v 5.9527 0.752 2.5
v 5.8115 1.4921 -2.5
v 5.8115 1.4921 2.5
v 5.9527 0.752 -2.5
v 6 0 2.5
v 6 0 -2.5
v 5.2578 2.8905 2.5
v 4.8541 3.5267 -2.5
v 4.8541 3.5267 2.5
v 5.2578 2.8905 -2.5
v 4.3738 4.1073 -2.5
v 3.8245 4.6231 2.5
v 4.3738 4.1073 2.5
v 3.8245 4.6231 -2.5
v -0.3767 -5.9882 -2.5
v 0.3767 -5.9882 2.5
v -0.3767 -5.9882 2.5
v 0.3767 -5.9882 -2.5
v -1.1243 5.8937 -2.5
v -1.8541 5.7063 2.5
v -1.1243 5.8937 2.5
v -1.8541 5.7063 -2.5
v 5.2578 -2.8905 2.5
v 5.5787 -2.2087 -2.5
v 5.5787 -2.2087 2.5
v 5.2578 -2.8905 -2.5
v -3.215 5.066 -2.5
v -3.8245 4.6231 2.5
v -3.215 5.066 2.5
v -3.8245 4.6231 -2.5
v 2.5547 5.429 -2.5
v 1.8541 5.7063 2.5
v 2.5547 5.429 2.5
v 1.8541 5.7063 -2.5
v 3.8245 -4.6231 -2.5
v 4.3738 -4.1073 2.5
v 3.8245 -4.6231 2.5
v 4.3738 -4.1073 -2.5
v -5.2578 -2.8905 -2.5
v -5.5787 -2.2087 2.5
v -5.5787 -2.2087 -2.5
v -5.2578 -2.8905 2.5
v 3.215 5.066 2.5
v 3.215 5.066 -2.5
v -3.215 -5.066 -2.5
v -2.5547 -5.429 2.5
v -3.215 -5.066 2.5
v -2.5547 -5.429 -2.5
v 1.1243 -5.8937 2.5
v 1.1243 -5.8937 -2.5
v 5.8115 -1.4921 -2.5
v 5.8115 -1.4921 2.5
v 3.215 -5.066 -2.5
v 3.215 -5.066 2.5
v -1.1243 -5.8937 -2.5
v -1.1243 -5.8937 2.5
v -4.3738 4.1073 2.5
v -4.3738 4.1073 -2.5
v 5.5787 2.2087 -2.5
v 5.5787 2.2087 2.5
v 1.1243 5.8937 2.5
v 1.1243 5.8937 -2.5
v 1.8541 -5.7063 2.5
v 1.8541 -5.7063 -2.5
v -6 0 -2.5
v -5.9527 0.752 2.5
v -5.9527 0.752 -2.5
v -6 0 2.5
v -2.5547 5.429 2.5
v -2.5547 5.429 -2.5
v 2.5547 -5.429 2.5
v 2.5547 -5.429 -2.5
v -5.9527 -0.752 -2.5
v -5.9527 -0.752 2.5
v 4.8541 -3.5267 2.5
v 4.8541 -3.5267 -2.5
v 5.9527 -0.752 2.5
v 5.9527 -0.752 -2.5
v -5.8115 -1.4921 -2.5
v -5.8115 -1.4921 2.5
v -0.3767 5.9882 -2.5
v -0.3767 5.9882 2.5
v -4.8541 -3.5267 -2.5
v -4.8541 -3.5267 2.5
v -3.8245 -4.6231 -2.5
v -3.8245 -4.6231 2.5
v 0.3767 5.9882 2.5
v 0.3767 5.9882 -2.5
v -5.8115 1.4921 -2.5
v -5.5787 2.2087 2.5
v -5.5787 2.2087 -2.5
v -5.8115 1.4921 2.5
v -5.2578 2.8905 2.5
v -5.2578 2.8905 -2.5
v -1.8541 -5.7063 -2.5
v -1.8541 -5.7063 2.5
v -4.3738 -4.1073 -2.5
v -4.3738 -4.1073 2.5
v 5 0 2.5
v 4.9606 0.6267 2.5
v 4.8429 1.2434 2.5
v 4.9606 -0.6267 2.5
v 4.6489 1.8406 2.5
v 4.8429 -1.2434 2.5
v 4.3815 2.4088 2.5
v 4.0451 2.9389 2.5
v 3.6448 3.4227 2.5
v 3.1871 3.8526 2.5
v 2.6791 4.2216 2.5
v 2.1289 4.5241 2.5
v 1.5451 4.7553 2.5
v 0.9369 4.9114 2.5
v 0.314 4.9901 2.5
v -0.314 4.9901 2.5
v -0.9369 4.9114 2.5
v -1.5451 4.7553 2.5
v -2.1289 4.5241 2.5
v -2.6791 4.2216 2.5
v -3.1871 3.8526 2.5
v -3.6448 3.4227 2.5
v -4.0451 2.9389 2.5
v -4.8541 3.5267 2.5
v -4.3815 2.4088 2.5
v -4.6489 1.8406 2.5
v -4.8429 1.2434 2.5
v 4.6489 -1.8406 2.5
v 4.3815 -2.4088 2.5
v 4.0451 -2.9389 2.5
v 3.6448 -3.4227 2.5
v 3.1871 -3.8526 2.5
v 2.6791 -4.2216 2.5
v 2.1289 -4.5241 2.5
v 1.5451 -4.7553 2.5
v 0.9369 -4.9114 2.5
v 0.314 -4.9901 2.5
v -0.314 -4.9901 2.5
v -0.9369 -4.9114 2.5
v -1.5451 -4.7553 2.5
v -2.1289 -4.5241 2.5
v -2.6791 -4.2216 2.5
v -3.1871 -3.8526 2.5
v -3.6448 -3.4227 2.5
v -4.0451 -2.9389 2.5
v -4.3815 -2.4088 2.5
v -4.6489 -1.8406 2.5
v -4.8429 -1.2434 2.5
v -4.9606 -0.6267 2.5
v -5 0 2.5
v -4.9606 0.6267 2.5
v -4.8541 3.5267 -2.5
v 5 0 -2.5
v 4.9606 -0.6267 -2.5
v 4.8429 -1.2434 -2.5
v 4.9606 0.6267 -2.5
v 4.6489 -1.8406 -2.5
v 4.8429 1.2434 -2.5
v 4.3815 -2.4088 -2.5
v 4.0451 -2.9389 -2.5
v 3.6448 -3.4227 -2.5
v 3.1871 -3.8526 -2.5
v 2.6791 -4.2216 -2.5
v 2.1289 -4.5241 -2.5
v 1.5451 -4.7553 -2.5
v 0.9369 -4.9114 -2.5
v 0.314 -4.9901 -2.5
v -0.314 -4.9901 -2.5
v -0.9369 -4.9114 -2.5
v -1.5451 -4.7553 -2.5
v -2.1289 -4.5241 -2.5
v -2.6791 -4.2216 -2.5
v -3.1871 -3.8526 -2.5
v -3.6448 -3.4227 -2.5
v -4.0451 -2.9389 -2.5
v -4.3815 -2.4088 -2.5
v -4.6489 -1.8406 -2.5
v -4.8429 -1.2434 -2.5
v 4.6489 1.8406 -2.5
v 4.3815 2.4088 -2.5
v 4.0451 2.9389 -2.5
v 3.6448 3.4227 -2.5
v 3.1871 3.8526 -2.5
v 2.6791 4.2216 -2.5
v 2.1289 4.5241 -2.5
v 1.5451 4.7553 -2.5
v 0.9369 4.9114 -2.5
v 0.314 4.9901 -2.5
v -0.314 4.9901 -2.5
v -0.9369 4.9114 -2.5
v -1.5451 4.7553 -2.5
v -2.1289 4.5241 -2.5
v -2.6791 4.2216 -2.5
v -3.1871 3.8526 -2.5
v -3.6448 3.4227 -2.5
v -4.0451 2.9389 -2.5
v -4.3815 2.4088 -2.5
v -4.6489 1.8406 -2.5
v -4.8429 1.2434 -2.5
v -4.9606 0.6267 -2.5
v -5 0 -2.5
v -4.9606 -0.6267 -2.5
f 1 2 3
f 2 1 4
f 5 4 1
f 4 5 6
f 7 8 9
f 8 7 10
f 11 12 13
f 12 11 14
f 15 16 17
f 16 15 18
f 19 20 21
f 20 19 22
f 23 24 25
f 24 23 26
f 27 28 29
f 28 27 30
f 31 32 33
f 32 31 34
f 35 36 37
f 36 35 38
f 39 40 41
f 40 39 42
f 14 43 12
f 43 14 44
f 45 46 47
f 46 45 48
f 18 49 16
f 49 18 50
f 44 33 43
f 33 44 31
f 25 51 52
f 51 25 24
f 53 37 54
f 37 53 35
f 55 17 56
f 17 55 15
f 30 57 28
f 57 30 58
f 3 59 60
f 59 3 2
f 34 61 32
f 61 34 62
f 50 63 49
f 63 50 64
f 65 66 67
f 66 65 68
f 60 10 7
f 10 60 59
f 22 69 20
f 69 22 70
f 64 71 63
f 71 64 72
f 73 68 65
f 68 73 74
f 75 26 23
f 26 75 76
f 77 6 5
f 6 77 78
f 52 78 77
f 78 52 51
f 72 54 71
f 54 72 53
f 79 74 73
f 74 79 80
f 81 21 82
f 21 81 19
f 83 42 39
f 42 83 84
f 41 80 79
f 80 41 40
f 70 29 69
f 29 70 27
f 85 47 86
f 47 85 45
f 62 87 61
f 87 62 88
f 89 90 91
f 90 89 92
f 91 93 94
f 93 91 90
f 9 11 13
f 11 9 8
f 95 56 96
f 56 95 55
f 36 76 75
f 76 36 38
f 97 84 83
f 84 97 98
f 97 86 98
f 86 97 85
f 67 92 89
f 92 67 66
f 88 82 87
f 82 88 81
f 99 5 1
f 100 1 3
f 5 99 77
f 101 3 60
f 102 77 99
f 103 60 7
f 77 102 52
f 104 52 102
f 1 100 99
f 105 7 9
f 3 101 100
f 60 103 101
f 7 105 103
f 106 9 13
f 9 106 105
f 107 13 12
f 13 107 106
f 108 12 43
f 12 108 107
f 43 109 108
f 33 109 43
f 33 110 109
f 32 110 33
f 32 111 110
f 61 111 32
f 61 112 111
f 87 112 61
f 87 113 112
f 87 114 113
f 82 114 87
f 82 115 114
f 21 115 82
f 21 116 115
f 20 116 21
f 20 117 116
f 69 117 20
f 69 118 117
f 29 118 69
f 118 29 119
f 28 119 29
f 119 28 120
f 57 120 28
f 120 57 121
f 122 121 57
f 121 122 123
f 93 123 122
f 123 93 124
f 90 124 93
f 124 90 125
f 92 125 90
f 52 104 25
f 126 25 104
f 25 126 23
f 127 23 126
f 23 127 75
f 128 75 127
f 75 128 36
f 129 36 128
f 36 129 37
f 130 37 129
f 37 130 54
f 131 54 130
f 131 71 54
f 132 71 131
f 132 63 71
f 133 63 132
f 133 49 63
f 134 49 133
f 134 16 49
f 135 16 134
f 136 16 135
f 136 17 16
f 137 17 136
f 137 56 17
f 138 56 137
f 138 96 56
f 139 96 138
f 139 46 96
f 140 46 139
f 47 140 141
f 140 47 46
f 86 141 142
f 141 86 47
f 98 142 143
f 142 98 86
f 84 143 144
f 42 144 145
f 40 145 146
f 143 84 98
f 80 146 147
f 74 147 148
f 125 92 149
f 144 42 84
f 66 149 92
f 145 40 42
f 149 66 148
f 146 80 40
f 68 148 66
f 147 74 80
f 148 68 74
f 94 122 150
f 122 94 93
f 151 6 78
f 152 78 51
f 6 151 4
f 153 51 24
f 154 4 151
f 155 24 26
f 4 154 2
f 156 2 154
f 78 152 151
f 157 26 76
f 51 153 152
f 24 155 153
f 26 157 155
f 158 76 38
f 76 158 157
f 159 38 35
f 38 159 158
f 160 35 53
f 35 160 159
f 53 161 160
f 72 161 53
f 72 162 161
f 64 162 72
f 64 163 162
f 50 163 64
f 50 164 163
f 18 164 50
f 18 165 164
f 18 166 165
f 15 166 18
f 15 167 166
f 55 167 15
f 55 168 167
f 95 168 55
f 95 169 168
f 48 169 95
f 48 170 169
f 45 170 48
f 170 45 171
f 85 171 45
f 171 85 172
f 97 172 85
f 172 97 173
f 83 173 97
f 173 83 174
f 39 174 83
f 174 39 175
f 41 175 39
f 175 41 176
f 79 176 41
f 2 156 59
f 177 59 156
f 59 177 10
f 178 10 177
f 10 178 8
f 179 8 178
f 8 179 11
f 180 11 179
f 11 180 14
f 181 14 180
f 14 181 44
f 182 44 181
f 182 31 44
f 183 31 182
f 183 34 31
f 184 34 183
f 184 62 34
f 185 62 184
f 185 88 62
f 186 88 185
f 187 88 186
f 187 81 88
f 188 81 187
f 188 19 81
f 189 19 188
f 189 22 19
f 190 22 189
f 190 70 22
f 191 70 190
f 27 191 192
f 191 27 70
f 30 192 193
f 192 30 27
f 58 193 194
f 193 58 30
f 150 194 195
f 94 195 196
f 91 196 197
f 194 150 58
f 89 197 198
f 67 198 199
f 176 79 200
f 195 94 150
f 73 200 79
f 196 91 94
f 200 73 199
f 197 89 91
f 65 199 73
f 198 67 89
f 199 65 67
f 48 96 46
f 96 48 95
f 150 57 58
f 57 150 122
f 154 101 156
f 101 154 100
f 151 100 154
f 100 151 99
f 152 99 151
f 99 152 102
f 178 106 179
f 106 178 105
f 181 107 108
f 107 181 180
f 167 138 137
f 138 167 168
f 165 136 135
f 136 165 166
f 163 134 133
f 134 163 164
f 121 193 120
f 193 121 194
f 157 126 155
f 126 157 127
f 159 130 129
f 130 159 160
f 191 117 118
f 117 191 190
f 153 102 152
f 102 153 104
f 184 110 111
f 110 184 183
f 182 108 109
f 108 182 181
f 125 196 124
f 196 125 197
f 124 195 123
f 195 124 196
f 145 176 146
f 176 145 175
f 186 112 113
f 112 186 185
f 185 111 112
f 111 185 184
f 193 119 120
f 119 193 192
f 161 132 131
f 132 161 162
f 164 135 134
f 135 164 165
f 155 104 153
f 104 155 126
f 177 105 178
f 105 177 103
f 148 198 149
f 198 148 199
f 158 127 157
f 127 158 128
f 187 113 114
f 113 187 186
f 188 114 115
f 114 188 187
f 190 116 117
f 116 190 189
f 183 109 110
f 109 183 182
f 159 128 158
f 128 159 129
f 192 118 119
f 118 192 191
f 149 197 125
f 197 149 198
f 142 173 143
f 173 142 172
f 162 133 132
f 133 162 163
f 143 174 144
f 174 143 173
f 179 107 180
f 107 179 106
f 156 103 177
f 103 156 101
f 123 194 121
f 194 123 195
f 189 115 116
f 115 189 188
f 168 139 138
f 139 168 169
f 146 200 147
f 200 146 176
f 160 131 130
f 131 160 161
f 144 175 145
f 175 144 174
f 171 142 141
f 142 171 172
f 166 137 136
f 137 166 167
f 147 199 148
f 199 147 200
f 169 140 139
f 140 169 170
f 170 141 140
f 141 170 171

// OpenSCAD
$fn = 50;


difference() {
	union() {
		translate(v = [0, 0, -2.5000000000]) {
			cylinder(h = 5, r = 6.0000000000);
		}
	}
	union() {
		translate(v = [0, 0, -100.0000000000]) {
			cylinder(h = 200, r = 5.0000000000);
		}
	}
}
